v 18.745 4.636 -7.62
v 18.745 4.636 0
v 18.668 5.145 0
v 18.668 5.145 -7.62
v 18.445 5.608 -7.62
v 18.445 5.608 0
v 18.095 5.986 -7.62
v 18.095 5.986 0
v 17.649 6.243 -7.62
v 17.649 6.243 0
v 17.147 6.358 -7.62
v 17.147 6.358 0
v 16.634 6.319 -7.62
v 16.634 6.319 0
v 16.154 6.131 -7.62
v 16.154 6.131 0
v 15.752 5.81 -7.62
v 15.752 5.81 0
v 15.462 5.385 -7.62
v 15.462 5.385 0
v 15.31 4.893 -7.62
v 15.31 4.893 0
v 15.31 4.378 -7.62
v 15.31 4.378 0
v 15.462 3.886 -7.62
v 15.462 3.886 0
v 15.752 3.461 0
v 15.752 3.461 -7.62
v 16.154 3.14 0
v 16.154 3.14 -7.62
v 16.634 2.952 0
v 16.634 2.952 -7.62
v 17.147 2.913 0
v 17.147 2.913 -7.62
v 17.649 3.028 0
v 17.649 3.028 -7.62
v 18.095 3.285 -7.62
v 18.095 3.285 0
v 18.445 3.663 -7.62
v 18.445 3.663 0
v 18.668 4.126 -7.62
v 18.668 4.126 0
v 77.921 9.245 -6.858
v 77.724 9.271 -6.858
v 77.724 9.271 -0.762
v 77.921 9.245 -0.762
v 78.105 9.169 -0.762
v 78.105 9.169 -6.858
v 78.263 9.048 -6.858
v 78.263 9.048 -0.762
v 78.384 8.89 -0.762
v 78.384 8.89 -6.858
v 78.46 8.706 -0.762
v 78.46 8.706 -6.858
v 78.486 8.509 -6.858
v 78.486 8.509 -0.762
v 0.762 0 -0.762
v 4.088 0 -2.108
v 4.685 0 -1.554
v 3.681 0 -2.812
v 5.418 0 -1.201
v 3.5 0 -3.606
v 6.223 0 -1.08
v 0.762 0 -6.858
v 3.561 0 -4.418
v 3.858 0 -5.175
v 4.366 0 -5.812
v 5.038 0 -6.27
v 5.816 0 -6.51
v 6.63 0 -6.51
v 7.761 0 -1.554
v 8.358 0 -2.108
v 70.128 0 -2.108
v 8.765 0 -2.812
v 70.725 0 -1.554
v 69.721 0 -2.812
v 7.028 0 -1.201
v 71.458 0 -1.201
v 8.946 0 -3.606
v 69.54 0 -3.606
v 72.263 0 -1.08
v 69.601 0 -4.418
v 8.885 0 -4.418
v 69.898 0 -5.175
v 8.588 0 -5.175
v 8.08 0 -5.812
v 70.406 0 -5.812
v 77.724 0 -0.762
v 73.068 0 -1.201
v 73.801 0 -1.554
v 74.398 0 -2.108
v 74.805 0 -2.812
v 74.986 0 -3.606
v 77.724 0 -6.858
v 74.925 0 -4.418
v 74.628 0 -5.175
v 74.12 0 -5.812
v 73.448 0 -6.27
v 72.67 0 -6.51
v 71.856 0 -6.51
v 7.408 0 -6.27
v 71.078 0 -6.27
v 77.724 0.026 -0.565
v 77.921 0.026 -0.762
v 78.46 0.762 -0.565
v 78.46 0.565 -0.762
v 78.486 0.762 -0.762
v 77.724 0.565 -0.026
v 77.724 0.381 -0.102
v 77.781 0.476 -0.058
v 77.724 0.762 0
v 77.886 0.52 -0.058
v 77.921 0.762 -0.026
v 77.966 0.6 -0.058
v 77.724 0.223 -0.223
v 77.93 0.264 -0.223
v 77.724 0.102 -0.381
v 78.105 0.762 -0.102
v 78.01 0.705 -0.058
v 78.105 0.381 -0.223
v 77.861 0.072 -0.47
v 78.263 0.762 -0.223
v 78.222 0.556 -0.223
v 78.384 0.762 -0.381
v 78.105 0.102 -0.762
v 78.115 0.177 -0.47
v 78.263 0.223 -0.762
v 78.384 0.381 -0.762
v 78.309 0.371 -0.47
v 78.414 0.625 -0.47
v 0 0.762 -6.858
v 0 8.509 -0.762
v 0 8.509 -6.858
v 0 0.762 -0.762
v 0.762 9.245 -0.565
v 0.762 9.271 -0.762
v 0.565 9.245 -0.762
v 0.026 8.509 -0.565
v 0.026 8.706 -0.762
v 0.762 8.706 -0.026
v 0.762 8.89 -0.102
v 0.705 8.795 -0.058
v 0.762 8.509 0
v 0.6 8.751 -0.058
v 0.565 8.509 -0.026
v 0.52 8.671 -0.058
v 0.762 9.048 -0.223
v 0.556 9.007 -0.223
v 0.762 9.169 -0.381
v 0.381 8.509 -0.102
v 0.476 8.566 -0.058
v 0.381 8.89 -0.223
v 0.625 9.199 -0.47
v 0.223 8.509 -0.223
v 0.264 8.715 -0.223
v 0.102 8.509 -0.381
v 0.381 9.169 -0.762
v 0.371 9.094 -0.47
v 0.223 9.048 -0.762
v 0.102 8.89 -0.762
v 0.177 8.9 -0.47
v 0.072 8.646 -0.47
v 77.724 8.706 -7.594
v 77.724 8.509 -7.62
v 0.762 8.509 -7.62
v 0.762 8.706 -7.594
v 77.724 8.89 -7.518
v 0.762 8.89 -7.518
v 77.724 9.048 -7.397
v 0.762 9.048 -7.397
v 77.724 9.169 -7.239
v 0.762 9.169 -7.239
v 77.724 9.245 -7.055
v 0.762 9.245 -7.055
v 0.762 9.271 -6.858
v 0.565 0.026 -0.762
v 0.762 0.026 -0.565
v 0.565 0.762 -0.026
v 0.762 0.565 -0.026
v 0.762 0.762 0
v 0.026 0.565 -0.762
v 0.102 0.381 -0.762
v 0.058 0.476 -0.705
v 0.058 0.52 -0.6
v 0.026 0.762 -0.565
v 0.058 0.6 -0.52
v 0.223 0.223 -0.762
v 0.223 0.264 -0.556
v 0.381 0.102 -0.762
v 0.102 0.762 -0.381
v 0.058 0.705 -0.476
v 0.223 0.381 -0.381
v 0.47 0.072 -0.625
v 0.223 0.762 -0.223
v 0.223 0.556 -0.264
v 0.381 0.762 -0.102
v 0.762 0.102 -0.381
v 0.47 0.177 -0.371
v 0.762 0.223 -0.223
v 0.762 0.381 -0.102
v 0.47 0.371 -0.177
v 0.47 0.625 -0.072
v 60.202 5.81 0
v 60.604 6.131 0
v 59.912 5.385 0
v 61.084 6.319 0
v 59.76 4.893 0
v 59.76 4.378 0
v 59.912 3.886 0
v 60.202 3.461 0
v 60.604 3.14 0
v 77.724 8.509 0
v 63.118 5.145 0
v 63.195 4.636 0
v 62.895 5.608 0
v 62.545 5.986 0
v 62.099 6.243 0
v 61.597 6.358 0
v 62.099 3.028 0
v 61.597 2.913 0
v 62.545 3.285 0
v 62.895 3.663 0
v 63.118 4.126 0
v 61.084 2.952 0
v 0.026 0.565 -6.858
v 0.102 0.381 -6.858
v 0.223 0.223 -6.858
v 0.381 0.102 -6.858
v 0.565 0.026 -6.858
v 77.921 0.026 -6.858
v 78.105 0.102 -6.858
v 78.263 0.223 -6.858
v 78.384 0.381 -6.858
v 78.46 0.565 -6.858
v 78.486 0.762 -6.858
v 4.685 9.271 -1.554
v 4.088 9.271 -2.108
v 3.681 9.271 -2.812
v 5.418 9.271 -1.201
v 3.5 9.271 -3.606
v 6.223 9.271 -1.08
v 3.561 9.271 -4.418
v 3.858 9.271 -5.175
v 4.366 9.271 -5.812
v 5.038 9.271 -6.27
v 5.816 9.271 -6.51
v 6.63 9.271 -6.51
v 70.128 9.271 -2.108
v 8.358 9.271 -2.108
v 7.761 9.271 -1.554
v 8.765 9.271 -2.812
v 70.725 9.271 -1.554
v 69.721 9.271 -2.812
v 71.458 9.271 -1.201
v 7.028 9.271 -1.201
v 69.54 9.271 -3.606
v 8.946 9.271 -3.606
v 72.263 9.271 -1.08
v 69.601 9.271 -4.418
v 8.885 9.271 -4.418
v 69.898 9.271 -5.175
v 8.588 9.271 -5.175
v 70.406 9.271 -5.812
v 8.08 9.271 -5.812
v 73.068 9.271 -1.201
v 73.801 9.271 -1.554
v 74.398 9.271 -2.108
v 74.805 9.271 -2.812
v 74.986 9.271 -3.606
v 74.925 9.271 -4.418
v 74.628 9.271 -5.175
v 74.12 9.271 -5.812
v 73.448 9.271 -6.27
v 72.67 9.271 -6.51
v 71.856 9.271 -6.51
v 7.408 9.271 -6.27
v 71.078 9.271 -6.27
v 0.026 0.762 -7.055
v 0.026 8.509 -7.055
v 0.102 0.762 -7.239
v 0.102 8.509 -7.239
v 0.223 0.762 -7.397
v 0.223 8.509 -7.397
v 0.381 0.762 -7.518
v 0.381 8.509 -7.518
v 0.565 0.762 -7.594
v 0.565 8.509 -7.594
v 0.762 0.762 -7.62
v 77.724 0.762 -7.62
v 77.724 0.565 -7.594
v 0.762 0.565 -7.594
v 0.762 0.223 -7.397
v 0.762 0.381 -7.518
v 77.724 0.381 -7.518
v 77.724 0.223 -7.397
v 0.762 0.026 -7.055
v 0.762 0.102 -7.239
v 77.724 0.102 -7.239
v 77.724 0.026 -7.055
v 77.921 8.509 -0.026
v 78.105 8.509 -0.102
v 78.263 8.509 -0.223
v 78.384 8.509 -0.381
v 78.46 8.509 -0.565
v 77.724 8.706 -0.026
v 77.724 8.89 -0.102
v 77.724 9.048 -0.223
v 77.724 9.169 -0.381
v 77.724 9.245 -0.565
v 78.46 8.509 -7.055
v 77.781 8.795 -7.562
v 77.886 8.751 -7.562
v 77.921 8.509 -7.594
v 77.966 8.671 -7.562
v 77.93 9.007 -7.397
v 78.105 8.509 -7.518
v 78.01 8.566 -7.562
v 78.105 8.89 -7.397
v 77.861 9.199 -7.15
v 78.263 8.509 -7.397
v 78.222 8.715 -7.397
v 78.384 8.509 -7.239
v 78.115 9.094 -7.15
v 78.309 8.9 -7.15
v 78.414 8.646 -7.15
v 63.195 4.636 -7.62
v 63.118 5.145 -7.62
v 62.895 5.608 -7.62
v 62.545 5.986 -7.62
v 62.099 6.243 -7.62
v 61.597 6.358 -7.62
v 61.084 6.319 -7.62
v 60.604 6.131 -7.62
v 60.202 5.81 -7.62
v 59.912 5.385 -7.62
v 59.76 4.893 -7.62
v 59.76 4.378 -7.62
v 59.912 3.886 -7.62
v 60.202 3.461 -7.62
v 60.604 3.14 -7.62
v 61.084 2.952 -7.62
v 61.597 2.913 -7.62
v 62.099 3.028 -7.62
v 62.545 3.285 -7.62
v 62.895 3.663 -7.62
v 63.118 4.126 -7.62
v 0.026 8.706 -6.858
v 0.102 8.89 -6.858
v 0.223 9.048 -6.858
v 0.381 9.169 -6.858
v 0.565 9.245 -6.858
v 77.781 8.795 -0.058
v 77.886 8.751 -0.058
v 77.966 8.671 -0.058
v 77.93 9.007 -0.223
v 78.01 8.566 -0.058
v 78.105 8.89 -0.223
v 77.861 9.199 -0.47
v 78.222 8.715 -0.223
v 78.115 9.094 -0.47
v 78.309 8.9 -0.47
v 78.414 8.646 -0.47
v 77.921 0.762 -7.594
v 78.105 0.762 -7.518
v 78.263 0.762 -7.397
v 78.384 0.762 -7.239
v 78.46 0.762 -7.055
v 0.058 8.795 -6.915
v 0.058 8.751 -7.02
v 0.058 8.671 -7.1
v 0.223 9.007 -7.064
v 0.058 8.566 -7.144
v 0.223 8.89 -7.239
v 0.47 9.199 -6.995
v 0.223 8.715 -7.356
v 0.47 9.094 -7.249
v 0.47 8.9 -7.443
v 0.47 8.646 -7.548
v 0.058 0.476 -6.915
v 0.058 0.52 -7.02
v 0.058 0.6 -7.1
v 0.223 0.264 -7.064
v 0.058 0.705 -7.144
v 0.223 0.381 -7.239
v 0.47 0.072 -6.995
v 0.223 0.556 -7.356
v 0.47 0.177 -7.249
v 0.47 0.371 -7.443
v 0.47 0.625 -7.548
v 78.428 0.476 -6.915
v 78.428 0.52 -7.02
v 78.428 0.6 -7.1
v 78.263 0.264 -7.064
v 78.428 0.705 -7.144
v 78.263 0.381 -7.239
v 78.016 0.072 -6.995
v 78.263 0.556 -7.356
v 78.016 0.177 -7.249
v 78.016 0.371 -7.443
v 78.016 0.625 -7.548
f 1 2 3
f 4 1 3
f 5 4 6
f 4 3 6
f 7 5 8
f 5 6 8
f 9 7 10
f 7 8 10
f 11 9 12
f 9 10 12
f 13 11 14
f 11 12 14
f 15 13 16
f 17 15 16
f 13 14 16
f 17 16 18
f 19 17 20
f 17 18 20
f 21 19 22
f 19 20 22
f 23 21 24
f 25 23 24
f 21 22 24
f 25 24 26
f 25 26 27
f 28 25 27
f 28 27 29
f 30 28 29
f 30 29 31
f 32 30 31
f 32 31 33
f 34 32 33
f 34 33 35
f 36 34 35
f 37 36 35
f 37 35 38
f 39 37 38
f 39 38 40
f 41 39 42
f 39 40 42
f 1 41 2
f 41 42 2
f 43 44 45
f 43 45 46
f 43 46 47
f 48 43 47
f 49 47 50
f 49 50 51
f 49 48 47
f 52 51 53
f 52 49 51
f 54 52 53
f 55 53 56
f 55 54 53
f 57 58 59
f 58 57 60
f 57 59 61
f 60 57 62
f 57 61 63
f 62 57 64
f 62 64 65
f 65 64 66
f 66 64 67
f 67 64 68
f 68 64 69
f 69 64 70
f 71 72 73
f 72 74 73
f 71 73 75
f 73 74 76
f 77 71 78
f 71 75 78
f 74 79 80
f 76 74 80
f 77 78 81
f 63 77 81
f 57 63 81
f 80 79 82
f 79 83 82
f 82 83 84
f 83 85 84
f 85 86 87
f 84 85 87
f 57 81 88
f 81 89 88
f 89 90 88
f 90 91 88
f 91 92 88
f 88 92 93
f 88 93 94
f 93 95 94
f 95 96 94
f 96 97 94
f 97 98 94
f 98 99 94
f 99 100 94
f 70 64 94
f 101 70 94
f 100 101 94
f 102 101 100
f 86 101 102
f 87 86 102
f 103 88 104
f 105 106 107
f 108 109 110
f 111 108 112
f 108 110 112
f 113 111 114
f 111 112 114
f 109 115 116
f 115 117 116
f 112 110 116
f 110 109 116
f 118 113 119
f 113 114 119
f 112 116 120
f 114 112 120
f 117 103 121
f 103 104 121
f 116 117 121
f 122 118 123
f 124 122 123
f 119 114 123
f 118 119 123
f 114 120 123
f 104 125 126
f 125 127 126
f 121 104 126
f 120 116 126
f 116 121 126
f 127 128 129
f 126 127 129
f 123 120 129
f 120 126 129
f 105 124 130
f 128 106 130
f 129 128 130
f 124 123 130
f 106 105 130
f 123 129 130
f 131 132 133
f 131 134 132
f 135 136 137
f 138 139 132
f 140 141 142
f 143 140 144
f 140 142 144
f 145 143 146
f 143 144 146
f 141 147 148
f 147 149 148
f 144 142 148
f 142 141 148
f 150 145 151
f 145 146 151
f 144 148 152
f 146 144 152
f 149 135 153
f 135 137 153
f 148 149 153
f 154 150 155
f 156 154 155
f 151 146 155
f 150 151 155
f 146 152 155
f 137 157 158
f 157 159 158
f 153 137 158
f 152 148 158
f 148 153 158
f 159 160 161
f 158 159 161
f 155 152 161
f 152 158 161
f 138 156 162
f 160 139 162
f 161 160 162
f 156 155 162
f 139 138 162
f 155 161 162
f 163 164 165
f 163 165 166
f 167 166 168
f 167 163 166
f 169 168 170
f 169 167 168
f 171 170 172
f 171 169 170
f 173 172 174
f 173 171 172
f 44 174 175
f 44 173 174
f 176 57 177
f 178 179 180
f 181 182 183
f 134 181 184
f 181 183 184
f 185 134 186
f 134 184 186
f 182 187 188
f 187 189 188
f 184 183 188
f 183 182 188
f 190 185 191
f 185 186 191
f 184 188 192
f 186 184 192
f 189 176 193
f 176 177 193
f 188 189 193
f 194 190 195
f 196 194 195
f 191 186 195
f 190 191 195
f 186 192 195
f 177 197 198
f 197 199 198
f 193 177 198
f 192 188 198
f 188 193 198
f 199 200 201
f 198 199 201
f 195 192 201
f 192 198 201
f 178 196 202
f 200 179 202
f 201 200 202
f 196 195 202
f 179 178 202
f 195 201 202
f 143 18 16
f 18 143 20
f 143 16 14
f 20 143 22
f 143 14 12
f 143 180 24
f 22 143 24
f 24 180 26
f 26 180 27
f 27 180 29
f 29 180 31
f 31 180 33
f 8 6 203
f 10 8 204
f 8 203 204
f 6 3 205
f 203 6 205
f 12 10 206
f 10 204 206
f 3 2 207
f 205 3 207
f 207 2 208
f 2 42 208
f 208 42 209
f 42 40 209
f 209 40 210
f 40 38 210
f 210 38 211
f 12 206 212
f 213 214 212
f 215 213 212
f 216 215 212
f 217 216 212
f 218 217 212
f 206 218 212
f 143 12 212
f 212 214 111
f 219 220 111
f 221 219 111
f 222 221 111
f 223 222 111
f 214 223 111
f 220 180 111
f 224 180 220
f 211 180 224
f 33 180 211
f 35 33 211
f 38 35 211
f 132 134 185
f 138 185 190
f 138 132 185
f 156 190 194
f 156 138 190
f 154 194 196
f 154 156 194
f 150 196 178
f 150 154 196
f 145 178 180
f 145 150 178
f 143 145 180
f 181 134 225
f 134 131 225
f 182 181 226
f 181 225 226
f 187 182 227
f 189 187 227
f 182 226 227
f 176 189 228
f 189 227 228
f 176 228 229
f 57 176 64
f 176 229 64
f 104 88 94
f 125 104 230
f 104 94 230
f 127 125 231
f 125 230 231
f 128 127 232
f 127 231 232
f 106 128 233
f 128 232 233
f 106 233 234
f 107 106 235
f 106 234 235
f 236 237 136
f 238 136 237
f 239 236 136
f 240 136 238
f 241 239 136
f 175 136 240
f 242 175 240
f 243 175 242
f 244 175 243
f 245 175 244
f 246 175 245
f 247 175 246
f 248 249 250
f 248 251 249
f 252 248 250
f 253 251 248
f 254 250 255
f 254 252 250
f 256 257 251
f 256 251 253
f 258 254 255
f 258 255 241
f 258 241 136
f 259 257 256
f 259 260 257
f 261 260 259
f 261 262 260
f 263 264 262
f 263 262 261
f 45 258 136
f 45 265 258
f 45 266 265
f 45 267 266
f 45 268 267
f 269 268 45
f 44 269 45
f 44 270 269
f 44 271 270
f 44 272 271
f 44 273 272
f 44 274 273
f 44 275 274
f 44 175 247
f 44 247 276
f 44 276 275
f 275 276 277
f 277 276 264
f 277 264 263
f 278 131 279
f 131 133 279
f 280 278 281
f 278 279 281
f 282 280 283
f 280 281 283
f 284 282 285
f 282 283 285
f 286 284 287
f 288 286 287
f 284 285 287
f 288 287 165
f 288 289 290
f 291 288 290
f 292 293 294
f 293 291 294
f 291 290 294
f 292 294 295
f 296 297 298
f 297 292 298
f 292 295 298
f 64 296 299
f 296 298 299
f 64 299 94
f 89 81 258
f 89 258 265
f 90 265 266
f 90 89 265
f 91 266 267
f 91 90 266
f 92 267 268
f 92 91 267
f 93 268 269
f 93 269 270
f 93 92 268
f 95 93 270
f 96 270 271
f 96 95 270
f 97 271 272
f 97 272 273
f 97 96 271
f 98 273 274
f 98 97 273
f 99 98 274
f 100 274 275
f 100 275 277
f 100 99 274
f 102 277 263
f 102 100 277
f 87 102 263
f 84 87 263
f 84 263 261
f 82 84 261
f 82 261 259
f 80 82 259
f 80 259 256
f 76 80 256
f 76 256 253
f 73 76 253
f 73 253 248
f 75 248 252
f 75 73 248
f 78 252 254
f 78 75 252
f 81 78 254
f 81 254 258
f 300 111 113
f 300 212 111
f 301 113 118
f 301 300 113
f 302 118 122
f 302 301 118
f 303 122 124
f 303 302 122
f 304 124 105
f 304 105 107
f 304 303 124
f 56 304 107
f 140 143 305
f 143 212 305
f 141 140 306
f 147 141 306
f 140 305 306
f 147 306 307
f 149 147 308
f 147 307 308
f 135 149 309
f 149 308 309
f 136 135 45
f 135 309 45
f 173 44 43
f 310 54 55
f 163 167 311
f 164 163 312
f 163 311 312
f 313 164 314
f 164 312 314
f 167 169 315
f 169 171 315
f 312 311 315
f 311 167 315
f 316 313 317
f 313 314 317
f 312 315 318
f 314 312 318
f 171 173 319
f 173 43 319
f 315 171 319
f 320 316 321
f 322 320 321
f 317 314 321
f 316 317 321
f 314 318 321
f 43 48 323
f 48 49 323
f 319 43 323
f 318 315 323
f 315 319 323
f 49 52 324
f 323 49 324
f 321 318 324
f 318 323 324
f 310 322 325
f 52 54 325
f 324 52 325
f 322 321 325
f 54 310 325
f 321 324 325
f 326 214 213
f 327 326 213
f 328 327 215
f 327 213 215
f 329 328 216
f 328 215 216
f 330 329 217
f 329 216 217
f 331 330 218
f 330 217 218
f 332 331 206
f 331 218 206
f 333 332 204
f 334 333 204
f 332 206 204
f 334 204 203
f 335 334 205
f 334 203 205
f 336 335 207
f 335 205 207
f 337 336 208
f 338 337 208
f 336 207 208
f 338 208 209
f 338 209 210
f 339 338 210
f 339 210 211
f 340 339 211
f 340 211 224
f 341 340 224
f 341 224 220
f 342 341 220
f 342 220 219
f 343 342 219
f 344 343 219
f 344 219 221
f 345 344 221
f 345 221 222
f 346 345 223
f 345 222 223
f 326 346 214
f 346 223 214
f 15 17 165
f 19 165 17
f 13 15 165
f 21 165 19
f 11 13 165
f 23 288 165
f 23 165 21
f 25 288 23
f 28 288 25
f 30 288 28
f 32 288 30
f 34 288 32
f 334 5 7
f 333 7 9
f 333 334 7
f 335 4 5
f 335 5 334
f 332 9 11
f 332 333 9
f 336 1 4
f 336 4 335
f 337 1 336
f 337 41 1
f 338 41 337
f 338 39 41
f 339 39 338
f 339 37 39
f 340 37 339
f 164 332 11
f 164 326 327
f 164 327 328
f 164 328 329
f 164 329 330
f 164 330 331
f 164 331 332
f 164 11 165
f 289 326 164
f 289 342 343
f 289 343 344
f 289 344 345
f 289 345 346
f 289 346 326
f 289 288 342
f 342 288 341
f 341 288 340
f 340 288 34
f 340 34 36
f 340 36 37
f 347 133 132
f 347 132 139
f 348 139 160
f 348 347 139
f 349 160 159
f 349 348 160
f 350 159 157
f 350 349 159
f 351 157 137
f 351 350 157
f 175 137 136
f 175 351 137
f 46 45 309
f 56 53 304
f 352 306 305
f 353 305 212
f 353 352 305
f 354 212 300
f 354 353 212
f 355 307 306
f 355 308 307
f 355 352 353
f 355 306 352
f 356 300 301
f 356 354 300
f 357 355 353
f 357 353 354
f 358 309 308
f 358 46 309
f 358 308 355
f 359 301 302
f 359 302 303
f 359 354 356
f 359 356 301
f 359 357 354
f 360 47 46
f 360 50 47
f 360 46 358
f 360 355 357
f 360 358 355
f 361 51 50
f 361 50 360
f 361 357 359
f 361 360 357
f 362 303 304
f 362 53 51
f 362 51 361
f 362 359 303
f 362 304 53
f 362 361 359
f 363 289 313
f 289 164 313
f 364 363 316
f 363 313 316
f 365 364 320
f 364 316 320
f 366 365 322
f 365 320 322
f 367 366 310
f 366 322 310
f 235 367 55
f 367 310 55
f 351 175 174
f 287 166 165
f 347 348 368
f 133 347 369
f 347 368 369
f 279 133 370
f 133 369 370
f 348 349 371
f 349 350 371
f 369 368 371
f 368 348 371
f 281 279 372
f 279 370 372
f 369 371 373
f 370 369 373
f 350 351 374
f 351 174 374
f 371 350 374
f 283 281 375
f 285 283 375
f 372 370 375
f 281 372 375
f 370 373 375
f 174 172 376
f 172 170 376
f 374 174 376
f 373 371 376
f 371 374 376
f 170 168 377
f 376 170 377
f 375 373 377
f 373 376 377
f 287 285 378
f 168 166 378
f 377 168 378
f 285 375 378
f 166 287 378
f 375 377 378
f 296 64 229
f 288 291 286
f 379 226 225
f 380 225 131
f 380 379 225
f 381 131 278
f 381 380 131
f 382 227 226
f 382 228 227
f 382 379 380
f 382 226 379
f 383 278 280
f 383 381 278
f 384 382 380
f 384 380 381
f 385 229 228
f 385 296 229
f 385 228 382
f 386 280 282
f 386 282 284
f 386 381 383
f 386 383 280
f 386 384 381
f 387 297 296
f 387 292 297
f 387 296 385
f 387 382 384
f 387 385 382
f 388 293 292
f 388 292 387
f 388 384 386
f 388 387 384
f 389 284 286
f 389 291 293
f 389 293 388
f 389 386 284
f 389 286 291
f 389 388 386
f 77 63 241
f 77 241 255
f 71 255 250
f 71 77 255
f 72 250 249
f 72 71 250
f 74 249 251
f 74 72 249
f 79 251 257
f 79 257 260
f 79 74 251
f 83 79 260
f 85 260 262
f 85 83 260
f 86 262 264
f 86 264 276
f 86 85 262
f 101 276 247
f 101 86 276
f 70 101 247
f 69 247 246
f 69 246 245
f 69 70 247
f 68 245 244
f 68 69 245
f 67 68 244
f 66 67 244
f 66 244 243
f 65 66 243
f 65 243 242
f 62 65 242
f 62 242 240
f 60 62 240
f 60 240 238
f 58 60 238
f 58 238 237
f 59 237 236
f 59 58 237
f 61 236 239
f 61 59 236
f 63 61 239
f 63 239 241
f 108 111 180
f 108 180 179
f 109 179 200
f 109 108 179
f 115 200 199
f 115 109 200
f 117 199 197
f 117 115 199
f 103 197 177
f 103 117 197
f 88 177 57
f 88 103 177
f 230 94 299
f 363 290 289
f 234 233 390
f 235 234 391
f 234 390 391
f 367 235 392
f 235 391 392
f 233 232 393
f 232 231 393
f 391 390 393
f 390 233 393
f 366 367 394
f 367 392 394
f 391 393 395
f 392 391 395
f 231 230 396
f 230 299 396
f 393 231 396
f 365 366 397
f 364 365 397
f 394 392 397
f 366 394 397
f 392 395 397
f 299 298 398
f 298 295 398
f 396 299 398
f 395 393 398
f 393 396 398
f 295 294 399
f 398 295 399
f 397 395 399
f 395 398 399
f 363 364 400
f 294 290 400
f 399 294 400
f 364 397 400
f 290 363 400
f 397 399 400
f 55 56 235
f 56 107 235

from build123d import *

# Parameters (mm, degrees)
SKETCH2_W           = 78.486
SKETCH2_H           = 7.62
SKETCH2_R           = 2.7305
BOSS_EXTRUDE1_DEPTH = 9.271
SKETCH3_R           = 1.7272
CUT_EXTRUDE1_DEPTH  = 7.62
FILLET1_R           = 0.762


with BuildPart() as part:
    # Sketch2 → Boss-Extrude1 (new body)
    with BuildSketch(Plane(origin=(0, 0, 0), x_dir=(1, 0, 0), z_dir=(0, 1, 0))):
        with Locations((39.243, 3.81)):
            Rectangle(SKETCH2_W, SKETCH2_H)
        with Locations(Location((6.223, 3.81, 0), (0, 0, 270))):
            Circle(SKETCH2_R, mode=Mode.SUBTRACT)
        with Locations(Location((72.263, 3.81, 0), (0, 0, 270))):
            Circle(SKETCH2_R, mode=Mode.SUBTRACT)
    extrude(amount=BOSS_EXTRUDE1_DEPTH)

    # Sketch3 → Cut-Extrude1 (cut)
    with BuildSketch(Plane.XY):
        with Locations((17.018, 4.6355)):
            Circle(SKETCH3_R)
        with Locations((61.468, 4.6355)):
            Circle(SKETCH3_R)
    extrude(amount=-CUT_EXTRUDE1_DEPTH, mode=Mode.SUBTRACT)

    # Fillet1
    fillet1_edges = [part.edges().sort_by_distance(p)[0] for p in [
        (78.486, 9.271, -3.81),
        (39.243, 9.271, -7.62),
        (0, 9.271, -3.81),
        (39.243, 0, -7.62),
        (78.486, 0, -3.81),
        (39.243, 0, 0),
        (0, 0, -3.81),
        (39.243, 9.271, 0),
        (0, 4.6355, -7.62),
        (78.486, 4.6355, -7.62),
        (78.486, 4.6355, 0),
        (0, 4.6355, 0),
    ]]
    fillet(fillet1_edges, radius=FILLET1_R)


solid = part.part
